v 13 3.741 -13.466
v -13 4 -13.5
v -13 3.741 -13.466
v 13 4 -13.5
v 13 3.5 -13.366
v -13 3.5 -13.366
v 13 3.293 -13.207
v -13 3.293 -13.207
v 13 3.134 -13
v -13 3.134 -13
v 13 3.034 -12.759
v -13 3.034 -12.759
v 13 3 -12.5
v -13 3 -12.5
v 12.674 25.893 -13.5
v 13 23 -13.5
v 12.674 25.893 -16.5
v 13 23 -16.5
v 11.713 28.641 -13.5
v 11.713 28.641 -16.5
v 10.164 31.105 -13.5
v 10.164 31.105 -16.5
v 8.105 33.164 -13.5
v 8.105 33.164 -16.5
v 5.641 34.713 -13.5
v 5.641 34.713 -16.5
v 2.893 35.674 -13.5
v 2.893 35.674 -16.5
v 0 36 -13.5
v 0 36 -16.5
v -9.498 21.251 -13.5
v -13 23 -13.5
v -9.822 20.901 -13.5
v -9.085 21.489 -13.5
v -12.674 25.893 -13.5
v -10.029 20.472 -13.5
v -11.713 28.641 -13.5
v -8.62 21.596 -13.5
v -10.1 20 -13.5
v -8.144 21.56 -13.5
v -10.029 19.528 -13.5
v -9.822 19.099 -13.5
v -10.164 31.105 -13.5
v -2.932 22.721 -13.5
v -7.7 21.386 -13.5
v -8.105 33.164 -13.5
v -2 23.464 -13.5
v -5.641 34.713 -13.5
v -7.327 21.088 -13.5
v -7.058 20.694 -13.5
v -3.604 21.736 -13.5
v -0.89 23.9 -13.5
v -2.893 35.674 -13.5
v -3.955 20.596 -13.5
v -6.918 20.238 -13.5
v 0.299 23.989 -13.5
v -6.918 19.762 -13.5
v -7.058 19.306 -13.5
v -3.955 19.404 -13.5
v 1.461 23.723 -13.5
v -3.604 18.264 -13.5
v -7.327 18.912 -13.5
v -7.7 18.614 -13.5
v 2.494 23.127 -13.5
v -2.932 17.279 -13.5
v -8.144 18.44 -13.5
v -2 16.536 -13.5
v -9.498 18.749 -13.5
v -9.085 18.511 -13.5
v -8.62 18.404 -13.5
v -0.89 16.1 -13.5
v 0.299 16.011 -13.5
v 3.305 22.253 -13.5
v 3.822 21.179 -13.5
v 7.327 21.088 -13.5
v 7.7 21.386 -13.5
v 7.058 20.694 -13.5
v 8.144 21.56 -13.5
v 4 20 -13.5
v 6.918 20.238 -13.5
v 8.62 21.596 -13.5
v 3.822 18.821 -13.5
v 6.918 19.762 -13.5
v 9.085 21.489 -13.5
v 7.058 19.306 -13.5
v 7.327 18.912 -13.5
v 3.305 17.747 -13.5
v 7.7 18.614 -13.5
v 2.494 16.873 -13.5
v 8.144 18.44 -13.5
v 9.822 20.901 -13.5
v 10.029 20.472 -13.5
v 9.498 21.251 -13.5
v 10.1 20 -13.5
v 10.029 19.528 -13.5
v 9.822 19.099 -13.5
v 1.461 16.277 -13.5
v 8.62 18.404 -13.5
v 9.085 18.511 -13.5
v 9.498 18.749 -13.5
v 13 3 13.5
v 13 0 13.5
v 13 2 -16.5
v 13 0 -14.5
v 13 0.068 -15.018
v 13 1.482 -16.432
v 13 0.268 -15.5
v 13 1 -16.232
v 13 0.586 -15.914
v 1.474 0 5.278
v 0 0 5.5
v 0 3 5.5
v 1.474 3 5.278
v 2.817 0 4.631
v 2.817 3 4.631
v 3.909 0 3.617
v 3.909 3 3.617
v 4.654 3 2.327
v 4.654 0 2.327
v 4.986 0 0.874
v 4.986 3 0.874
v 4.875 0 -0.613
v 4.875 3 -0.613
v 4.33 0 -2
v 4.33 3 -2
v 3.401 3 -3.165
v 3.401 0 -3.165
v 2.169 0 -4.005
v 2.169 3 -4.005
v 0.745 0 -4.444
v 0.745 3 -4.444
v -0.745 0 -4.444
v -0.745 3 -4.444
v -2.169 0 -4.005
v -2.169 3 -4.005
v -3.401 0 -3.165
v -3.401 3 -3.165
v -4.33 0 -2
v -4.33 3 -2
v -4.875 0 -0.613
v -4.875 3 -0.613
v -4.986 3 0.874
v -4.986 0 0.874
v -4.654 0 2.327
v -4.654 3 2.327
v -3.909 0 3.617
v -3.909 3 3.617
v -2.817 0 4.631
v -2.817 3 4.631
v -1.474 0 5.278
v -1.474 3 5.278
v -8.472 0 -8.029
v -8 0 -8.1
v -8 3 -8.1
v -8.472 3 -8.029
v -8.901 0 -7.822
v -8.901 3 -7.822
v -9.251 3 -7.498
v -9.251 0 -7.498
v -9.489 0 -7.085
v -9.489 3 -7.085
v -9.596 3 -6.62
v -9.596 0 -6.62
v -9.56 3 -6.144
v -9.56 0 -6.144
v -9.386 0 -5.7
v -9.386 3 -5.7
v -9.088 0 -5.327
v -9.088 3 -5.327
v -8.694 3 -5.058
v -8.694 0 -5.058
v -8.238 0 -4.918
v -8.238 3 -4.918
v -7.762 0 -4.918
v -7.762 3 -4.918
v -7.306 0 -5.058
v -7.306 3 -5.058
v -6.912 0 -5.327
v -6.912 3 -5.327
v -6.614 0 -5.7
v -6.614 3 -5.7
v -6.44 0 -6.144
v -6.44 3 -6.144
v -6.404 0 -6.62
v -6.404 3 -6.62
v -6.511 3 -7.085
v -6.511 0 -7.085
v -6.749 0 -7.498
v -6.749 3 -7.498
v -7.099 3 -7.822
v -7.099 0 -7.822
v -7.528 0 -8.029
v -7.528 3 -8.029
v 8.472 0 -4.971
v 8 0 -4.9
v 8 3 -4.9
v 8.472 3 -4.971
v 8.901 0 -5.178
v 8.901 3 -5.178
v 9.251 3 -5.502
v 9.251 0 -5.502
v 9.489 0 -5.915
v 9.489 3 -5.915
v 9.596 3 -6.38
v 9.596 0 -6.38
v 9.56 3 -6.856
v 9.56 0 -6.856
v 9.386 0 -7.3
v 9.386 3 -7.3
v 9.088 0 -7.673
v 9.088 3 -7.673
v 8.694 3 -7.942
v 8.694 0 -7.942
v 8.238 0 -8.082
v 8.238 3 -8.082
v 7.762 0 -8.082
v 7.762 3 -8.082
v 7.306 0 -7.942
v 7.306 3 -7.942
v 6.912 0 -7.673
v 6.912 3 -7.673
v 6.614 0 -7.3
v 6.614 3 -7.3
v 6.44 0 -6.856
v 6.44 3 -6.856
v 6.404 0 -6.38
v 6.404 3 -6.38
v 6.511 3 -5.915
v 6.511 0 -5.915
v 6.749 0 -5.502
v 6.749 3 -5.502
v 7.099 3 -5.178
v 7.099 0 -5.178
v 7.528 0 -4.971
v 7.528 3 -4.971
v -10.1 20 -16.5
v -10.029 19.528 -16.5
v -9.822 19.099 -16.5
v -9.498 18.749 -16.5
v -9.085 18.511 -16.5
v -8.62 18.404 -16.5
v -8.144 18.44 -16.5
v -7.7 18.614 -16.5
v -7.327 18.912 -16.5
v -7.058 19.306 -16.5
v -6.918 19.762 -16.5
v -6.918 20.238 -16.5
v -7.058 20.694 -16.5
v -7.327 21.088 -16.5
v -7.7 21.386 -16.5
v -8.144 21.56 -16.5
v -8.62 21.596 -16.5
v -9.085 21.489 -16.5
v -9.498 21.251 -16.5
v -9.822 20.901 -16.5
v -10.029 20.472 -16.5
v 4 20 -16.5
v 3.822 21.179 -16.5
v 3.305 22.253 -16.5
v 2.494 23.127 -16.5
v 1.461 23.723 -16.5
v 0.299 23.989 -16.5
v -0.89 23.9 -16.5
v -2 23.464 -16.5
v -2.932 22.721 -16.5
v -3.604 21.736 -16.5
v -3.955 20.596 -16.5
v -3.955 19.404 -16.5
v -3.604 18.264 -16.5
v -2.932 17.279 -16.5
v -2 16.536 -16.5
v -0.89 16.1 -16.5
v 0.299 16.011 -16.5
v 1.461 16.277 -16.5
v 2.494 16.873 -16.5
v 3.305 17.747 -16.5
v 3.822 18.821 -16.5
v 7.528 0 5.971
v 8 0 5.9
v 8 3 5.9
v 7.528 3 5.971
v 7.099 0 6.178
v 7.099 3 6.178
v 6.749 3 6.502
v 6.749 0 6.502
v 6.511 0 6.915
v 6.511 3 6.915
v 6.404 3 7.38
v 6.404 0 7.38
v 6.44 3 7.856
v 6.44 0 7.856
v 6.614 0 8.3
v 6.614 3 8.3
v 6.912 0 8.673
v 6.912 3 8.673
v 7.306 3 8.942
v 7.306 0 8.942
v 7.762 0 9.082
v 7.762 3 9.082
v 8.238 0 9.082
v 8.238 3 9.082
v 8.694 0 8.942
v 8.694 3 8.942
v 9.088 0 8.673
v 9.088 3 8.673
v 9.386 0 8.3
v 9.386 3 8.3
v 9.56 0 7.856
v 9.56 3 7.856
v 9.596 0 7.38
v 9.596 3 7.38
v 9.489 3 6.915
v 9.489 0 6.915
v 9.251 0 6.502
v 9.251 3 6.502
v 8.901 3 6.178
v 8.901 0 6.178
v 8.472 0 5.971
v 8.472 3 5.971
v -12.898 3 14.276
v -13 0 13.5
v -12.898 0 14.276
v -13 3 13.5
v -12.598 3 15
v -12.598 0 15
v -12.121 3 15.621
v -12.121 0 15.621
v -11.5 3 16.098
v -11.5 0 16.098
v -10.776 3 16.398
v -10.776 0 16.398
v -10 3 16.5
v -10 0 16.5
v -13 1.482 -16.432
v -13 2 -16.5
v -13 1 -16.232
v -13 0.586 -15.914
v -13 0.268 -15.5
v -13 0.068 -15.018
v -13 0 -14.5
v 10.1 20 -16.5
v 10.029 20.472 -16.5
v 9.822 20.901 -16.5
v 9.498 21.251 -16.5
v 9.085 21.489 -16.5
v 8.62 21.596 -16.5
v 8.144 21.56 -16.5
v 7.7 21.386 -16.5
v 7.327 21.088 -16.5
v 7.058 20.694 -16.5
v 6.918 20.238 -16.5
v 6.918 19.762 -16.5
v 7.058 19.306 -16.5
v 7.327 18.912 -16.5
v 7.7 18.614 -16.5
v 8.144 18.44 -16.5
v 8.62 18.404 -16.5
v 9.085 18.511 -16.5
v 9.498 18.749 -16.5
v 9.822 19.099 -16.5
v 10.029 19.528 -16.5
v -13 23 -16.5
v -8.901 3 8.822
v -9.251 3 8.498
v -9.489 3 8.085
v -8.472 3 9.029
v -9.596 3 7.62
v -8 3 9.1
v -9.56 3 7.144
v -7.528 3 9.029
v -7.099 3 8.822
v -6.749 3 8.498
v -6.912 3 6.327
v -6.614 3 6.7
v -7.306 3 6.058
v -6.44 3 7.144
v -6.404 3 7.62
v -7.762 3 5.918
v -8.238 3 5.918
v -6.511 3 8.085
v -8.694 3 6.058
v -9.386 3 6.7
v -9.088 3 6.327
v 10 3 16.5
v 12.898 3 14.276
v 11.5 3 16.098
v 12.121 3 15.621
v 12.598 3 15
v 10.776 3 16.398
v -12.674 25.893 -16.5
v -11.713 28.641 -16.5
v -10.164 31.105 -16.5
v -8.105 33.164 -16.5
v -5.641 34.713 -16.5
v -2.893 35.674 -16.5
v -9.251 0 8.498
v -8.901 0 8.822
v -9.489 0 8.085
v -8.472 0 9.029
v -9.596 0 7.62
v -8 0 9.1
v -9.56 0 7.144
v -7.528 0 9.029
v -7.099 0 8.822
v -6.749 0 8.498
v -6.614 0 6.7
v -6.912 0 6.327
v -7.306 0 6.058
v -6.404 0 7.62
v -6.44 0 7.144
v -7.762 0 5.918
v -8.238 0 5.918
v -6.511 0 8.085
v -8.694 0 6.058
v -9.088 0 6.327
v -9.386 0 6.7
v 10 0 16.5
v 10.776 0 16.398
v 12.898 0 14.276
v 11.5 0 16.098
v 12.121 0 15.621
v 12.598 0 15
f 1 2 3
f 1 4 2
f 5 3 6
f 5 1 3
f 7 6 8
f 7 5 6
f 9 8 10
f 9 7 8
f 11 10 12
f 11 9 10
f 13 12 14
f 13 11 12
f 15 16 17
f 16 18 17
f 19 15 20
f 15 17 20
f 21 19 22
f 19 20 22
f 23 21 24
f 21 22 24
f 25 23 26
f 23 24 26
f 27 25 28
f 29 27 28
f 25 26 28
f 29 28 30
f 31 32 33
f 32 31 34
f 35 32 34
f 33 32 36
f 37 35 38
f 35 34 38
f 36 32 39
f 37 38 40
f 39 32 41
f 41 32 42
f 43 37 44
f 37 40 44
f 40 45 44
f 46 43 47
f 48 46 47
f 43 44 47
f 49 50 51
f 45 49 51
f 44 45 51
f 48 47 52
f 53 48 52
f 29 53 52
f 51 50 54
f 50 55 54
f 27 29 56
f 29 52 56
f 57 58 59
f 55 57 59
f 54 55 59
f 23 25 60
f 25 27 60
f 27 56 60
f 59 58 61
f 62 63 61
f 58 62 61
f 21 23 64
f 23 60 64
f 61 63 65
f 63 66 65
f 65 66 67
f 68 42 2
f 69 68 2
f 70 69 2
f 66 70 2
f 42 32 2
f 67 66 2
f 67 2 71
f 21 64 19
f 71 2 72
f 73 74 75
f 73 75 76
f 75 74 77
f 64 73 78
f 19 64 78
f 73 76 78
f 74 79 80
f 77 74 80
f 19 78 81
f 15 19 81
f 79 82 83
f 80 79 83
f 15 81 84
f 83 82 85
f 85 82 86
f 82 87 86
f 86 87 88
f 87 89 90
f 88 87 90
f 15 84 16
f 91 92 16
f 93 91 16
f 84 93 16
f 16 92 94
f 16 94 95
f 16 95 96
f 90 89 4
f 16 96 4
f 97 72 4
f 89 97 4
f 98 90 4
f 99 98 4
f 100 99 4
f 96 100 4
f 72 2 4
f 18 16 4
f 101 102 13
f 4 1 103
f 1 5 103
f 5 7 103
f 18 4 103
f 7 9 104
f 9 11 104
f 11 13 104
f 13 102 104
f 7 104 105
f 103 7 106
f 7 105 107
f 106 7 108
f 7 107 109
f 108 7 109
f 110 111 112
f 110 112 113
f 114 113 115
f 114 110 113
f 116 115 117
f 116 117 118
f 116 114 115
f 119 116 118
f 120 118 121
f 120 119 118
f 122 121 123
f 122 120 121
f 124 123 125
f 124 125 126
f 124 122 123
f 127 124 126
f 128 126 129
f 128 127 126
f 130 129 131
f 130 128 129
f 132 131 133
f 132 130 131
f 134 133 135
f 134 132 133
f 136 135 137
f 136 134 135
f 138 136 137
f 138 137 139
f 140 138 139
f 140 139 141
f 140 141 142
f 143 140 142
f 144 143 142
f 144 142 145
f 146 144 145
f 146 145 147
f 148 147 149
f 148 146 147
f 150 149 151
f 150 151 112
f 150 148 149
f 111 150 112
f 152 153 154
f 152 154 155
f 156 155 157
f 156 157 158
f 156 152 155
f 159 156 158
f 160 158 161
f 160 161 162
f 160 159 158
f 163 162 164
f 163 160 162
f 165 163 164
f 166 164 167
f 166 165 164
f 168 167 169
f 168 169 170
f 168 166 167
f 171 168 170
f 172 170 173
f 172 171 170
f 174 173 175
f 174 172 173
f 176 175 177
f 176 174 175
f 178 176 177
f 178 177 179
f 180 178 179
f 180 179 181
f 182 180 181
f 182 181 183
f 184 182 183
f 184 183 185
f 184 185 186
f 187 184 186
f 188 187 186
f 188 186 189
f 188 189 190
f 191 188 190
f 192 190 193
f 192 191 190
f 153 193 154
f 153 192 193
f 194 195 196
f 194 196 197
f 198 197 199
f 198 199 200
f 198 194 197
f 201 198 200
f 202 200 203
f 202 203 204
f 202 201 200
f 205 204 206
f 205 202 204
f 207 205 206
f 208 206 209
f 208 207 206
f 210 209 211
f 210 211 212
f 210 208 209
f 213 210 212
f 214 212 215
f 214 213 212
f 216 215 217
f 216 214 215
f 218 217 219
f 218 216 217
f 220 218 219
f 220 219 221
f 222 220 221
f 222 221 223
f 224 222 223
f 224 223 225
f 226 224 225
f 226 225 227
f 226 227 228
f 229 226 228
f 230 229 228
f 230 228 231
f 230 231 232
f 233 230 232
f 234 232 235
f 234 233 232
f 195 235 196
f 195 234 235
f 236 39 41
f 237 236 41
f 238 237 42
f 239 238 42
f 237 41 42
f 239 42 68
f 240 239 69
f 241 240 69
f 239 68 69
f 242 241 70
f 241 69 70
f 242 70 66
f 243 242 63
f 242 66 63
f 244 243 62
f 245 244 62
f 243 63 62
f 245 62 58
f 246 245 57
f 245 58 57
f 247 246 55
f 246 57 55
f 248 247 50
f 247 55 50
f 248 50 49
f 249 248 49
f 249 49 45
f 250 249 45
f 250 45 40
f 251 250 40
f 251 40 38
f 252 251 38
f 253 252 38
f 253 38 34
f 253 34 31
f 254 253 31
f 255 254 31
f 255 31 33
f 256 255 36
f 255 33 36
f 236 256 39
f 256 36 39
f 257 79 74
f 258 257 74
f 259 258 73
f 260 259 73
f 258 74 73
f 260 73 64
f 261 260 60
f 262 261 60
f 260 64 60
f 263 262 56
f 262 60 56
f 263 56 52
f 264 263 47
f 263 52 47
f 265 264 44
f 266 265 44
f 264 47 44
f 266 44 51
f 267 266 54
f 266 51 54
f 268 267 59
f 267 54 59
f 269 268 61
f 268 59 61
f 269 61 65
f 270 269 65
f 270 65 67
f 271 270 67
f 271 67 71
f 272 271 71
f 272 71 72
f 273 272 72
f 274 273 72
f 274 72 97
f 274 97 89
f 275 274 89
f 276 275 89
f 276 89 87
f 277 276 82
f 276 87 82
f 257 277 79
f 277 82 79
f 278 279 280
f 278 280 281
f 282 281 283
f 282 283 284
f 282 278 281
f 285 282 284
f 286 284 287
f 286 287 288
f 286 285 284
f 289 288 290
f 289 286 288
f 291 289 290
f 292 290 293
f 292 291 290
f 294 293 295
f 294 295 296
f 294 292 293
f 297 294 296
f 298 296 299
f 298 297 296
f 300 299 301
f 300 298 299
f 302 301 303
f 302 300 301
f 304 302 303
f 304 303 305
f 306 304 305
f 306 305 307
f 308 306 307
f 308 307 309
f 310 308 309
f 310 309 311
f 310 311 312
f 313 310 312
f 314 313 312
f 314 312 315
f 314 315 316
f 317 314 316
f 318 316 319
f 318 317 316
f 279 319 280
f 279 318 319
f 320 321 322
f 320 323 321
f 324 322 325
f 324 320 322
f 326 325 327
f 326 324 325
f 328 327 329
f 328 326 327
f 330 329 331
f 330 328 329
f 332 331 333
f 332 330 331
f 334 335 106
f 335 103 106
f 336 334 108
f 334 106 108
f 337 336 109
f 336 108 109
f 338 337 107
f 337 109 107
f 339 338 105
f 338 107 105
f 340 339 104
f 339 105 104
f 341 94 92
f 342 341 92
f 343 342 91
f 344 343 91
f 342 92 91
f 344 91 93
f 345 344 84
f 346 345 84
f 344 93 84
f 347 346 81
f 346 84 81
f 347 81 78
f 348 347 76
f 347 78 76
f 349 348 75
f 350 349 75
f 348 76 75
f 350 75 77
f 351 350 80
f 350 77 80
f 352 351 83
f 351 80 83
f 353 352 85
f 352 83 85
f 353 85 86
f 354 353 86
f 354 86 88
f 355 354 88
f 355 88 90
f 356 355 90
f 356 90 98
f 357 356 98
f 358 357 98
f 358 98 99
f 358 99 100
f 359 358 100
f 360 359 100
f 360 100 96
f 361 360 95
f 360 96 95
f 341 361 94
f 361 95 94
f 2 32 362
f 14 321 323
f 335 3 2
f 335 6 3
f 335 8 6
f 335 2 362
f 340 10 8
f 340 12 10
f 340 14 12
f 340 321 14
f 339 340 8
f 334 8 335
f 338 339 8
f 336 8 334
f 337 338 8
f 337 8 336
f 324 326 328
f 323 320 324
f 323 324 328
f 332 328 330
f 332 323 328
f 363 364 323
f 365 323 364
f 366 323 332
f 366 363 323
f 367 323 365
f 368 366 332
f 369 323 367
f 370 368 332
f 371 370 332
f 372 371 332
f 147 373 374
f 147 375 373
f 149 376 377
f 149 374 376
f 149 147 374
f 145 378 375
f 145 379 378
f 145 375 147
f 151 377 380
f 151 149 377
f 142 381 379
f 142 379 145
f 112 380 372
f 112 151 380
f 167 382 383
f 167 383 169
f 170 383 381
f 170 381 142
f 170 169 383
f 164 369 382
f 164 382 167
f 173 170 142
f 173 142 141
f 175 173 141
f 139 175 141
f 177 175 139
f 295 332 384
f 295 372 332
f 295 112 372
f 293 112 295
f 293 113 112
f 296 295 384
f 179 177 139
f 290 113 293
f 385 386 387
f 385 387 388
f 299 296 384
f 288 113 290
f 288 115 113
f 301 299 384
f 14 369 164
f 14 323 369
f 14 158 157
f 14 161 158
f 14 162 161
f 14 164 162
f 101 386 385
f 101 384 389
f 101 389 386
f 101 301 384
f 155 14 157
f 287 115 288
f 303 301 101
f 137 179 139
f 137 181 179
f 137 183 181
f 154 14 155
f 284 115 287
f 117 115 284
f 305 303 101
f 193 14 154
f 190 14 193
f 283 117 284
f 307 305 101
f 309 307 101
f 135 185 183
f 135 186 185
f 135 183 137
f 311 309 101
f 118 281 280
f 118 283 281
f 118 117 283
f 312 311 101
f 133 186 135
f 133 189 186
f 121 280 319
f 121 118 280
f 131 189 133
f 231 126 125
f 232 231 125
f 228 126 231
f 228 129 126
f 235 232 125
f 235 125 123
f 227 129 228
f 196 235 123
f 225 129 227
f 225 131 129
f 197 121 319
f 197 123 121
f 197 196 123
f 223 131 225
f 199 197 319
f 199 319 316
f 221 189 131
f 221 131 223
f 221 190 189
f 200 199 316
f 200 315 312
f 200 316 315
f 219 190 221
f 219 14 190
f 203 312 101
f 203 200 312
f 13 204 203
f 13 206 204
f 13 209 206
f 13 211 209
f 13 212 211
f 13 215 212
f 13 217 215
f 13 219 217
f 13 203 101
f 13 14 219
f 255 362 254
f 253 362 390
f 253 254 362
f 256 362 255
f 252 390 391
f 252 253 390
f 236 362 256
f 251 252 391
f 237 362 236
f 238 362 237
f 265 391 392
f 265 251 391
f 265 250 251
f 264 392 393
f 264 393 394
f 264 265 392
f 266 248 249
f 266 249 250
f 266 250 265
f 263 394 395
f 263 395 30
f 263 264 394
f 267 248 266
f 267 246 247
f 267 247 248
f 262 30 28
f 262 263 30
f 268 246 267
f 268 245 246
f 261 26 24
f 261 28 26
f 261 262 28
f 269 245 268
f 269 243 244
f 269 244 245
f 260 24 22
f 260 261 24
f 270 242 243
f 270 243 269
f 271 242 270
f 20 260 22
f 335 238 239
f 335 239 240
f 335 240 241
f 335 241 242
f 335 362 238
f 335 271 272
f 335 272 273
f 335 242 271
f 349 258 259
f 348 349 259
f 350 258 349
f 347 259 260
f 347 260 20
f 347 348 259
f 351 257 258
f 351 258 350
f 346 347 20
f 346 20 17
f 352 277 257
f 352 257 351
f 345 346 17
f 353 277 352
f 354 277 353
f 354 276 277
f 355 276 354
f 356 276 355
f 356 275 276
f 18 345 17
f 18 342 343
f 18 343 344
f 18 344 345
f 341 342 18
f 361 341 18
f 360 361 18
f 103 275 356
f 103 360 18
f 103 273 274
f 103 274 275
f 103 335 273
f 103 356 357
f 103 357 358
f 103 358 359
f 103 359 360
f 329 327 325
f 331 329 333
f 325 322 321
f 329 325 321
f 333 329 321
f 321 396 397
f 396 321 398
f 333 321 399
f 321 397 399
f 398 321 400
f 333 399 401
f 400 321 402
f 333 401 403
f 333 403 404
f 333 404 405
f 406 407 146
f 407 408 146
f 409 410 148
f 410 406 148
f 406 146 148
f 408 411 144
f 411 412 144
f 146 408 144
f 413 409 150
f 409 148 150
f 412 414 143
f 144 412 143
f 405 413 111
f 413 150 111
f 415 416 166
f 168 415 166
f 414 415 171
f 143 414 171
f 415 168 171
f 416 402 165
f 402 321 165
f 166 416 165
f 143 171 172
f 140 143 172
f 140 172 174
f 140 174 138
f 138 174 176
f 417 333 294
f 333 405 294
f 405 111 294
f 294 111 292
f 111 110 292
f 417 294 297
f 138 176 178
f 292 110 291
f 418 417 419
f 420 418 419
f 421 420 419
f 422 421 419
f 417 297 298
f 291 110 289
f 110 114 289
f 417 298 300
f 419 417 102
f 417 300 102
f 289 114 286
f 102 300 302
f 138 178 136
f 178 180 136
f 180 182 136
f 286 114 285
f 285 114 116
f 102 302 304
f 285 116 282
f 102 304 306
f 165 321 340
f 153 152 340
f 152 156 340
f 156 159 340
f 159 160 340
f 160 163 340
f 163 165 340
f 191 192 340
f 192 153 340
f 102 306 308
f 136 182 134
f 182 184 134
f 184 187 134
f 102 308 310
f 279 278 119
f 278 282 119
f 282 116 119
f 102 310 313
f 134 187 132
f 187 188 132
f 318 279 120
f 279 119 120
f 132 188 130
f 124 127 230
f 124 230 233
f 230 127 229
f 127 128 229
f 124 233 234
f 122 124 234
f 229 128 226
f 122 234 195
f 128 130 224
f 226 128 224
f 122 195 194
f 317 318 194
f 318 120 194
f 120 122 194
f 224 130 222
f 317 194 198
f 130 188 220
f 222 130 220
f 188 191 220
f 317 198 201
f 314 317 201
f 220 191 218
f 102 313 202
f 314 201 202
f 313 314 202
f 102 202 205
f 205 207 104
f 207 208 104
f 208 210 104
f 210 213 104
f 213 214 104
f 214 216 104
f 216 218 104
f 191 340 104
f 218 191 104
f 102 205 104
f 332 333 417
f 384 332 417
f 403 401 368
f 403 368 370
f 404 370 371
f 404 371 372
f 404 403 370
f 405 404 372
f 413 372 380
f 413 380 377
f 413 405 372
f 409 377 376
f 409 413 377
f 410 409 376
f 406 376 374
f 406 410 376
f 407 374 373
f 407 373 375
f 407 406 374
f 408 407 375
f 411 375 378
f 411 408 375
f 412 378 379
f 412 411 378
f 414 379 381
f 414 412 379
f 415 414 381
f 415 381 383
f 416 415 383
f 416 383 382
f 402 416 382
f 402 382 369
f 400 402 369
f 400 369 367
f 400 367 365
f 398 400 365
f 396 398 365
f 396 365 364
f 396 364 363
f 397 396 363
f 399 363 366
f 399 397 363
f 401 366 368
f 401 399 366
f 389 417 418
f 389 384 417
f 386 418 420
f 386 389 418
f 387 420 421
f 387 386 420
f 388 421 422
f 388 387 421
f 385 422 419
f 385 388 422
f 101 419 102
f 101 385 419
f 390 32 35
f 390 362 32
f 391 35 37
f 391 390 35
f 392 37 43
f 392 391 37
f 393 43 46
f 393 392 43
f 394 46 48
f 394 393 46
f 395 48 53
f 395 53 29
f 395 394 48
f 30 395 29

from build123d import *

# Parameters (mm, degrees)
SKETCH1_W           = 26
SKETCH1_H           = 33
SKETCH1_R           = 5
SKETCH1_R_2         = 1.6
BOSS_EXTRUDE1_DEPTH = 3
FILLET2_R           = 3
SKETCH2_W           = 26
SKETCH2_H           = 3
BOSS_EXTRUDE2_DEPTH = 33
FILLET3_R           = 13
SKETCH3_R           = 4
SKETCH3_R_2         = 1.6
CUT_EXTRUDE1_DEPTH  = 3
FILLET4_R           = 2
FILLET5_R           = 1


with BuildPart() as part:
    # Sketch1 → Boss-Extrude1 (new body)
    with BuildSketch(Plane(origin=(0, 0, 0), x_dir=(1, 0, 0), z_dir=(0, 1, 0))):
        Rectangle(SKETCH1_W, SKETCH1_H)
        with Locations(Location((0, -0.5, 0), (0, 0, 270))):
            Circle(SKETCH1_R, mode=Mode.SUBTRACT)
        with Locations(Location((8, 6.5, 0), (0, 0, 270))):
            Circle(SKETCH1_R_2, mode=Mode.SUBTRACT)
        with Locations(Location((-8, 6.5, 0), (0, 0, 90))):
            Circle(SKETCH1_R_2, mode=Mode.SUBTRACT)
        with Locations(Location((8, -7.5, 0), (0, 0, 90))):
            Circle(SKETCH1_R_2, mode=Mode.SUBTRACT)
        with Locations(Location((-8, -7.5, 0), (0, 0, 270))):
            Circle(SKETCH1_R_2, mode=Mode.SUBTRACT)
    extrude(amount=BOSS_EXTRUDE1_DEPTH)

    # Fillet2
    fillet2_edges = [part.edges().sort_by_distance(p)[0] for p in [
        (13, 1.5, 16.5),
        (-13, 1.5, 16.5),
    ]]
    fillet(fillet2_edges, radius=FILLET2_R)

    # Sketch2 → Boss-Extrude2 (add)
    with BuildSketch(Plane(origin=(0, 3, 0), x_dir=(1, 0, 0), z_dir=(0, 1, 0))):
        with Locations((0, 15)):
            Rectangle(SKETCH2_W, SKETCH2_H)
    extrude(amount=BOSS_EXTRUDE2_DEPTH)

    # Fillet3
    fillet3_edges = [part.edges().sort_by_distance(p)[0] for p in [
        (-13, 36, -15),
        (13, 36, -15),
    ]]
    fillet(fillet3_edges, radius=FILLET3_R - 0.0001)  # a hair under: the kernel refuses the full size

    # Sketch3 → Cut-Extrude1 (cut)
    with BuildSketch(Plane.XY.offset(-13.5)):
        with Locations((0, 20)):
            Circle(SKETCH3_R)
        with Locations((8.5, 20)):
            Circle(SKETCH3_R_2)
        with Locations(Location((-8.5, 20, 0), (0, 0, 180))):
            Circle(SKETCH3_R_2)
    extrude(amount=-CUT_EXTRUDE1_DEPTH, mode=Mode.SUBTRACT)

    # Fillet4
    fillet4_edges = [part.edges().sort_by_distance(p)[0] for p in [
        (0, 0, -16.5),
    ]]
    fillet(fillet4_edges, radius=FILLET4_R)

    # Fillet5
    fillet5_edges = [part.edges().sort_by_distance(p)[0] for p in [
        (0, 3, -13.5),
    ]]
    fillet(fillet5_edges, radius=FILLET5_R)


solid = part.part
